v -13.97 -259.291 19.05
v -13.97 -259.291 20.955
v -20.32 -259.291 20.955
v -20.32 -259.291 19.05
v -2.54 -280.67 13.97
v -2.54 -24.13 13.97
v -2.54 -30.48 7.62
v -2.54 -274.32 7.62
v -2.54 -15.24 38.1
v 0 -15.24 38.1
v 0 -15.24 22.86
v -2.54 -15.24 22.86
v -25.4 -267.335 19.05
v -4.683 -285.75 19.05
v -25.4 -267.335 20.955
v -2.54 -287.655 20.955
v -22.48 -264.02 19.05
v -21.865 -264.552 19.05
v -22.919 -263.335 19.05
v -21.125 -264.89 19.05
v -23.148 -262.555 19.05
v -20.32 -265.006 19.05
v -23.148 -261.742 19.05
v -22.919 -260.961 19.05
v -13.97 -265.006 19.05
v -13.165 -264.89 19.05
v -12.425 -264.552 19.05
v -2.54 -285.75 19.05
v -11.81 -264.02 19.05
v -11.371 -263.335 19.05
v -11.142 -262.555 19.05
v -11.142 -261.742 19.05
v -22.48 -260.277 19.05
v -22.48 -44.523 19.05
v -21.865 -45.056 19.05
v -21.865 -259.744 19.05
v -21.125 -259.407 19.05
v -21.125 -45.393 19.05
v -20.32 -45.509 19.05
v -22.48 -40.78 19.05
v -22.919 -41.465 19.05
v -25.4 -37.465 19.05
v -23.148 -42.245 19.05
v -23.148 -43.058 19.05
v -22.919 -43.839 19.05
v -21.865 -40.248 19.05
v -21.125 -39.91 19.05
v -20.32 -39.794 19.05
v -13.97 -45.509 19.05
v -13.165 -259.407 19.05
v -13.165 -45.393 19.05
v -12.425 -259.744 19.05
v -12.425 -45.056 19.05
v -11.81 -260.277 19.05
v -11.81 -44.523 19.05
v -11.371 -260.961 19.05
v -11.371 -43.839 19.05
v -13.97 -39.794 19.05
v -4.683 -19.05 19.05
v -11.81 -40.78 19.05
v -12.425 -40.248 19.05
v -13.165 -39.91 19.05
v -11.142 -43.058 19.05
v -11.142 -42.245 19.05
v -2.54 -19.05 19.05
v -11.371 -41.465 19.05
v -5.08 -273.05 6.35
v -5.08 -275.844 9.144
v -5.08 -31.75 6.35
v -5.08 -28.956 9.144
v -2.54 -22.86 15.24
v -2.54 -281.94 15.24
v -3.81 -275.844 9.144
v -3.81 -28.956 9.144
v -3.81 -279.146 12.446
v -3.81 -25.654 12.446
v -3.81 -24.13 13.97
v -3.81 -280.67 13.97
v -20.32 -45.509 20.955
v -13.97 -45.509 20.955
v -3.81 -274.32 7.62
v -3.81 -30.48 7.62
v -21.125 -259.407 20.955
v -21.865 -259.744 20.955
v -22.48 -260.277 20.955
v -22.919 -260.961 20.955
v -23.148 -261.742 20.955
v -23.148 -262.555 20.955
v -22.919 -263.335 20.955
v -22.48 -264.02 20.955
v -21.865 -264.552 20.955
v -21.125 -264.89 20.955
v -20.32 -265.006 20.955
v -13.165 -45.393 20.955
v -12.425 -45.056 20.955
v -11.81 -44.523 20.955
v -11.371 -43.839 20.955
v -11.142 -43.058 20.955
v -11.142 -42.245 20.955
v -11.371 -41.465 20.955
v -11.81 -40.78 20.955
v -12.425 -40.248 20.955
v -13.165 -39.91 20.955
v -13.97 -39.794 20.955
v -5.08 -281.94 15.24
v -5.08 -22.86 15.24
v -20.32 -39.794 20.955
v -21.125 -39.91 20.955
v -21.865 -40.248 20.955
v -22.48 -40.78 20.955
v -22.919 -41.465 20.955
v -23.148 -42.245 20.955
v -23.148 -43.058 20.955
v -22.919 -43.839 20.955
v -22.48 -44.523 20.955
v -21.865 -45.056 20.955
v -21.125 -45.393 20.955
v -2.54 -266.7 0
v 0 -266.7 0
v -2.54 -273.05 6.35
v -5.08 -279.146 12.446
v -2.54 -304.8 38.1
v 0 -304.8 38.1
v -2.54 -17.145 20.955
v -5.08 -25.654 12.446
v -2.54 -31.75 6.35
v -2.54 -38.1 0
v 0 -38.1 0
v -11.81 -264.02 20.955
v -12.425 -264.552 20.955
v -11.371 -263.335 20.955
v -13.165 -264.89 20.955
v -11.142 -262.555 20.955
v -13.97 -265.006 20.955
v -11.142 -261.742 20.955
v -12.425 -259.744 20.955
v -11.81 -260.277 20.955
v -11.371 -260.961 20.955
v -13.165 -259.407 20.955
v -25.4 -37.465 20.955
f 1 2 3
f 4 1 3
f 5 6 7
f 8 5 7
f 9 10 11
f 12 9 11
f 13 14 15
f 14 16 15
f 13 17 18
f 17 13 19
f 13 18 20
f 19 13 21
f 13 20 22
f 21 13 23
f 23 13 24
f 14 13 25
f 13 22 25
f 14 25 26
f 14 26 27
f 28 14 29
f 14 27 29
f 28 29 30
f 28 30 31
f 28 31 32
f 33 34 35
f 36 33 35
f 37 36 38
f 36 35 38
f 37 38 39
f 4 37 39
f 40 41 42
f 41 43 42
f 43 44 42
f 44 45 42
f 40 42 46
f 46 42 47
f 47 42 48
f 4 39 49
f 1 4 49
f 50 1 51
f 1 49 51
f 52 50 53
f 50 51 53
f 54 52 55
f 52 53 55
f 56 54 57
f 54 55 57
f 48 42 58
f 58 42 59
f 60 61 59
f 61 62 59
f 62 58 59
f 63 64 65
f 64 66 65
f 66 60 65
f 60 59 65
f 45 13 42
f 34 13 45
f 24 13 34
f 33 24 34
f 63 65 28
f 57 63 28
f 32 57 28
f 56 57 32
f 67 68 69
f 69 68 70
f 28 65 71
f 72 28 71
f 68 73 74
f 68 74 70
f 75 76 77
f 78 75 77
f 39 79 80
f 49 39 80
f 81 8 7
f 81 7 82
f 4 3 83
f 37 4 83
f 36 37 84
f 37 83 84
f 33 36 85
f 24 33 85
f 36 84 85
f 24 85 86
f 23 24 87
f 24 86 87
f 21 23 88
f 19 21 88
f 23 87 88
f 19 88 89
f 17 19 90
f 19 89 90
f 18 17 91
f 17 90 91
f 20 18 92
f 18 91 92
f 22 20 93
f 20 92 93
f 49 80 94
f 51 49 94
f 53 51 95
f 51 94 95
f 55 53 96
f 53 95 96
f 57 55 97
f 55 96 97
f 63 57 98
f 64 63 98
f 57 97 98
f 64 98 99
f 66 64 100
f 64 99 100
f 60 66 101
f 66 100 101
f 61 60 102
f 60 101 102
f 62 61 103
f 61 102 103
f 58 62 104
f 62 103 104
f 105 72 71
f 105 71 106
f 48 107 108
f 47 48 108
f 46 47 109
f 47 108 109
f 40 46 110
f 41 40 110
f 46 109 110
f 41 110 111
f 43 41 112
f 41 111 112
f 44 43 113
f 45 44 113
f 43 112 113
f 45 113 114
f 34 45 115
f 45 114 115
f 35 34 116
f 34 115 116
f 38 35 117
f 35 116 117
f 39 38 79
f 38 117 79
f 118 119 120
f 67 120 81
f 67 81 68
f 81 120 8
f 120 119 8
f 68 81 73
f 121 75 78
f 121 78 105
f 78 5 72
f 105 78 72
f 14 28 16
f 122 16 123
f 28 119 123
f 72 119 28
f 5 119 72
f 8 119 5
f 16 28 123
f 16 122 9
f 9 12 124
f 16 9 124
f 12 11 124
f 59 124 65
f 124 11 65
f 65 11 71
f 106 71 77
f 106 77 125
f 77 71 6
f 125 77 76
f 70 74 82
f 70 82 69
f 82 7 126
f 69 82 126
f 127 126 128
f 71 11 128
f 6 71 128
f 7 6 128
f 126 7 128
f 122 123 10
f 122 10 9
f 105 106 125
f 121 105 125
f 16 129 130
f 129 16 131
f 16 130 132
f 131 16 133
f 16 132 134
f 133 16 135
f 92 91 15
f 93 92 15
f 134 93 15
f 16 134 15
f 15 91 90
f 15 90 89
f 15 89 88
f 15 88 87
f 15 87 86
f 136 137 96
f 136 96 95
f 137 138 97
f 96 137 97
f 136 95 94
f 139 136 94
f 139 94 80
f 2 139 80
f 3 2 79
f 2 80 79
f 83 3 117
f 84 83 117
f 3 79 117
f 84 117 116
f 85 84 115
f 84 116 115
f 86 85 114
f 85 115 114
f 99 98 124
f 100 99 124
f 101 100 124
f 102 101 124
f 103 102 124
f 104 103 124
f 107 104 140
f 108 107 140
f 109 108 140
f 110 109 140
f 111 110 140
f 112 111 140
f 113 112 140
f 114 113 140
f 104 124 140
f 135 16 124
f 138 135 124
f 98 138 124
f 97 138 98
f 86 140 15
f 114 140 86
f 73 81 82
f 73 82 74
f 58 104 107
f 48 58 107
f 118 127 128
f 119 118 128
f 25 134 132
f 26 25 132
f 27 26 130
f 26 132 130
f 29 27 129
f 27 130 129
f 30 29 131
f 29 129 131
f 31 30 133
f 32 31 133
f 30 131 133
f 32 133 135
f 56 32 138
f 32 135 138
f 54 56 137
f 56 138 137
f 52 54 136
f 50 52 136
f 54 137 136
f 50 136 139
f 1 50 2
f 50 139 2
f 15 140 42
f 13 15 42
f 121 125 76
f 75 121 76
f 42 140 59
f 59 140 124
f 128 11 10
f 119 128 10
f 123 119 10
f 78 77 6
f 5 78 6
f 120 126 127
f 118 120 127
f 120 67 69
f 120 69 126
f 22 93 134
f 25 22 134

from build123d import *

# Parameters (mm, degrees)
F1_DEPTH = 304.8
F3_DEPTH = 25.4
F5_DEPTH = 25.4
F7_DEPTH = 25.4
F9_DEPTH = 25.4


with BuildPart() as f1:
    # F0 (on Front) → F1 (new body)
    with BuildSketch(Plane.XZ):
        Polygon((-2.54, 0), (0, 0), (0, 38.1), (-2.54, 38.1), (-2.54, 20.955), (-25.4, 20.955), (-25.4, 19.05), (-2.54, 19.05), (-2.54, 15.24), (-5.08, 15.24), (-5.08, 12.446), (-3.81, 12.446), (-3.81, 13.97), (-2.54, 13.97), (-2.54, 7.62), (-3.81, 7.62), (-3.81, 9.144), (-5.08, 9.144), (-5.08, 6.35), (-2.54, 6.35), align=None)
    extrude(amount=F1_DEPTH)

    # F2 (on face) → F3 (cut)
    with BuildSketch(Plane.YZ):
        Polygon((-266.7, 0), (-304.8, 38.1), (-304.8, 0), align=None)
        Polygon((0, 0), (0, 38.1), (-38.1, 0), align=None)
    extrude(amount=-F3_DEPTH, mode=Mode.SUBTRACT)

    # F4 (on face) → F5 (cut)
    with BuildSketch(Plane.XY.offset(20.955)):
        Polygon((-25.4, -37.465), (-2.54, -17.145), (-25.4, -17.145), align=None)
        Polygon((-25.4, -287.655), (-2.54, -287.655), (-25.4, -267.335), align=None)
    extrude(amount=-F5_DEPTH, mode=Mode.SUBTRACT)

    # F6 (on face) → F7 (cut)
    with BuildSketch(Plane.XY.offset(20.955)):
        with BuildLine():
            Line((-13.97, -39.794183), (-20.32, -39.794183))
            ThreePointArc((-20.32, -39.794183), (-23.1775, -42.651683), (-20.32, -45.509183))
            Line((-20.32, -45.509183), (-13.97, -45.509183))
            ThreePointArc((-13.97, -45.509183), (-11.1125, -42.651683), (-13.97, -39.794183))
        make_face()
        with BuildLine():
            Line((-20.32, -265.005817), (-13.97, -265.005817))
            ThreePointArc((-13.97, -265.005817), (-11.1125, -262.148317), (-13.97, -259.290817))
            Line((-13.97, -259.290817), (-20.32, -259.290817))
            ThreePointArc((-20.32, -259.290817), (-23.1775, -262.148317), (-20.32, -265.005817))
        make_face()
    extrude(amount=-F7_DEPTH, mode=Mode.SUBTRACT)

    # F8 (on face) → F9 (cut)
    with BuildSketch(Plane.YZ):
        Polygon((-15.24, 22.86), (0, 38.1), (-15.24, 38.1), align=None)
    extrude(amount=-F9_DEPTH, mode=Mode.SUBTRACT)


solid = f1.part
